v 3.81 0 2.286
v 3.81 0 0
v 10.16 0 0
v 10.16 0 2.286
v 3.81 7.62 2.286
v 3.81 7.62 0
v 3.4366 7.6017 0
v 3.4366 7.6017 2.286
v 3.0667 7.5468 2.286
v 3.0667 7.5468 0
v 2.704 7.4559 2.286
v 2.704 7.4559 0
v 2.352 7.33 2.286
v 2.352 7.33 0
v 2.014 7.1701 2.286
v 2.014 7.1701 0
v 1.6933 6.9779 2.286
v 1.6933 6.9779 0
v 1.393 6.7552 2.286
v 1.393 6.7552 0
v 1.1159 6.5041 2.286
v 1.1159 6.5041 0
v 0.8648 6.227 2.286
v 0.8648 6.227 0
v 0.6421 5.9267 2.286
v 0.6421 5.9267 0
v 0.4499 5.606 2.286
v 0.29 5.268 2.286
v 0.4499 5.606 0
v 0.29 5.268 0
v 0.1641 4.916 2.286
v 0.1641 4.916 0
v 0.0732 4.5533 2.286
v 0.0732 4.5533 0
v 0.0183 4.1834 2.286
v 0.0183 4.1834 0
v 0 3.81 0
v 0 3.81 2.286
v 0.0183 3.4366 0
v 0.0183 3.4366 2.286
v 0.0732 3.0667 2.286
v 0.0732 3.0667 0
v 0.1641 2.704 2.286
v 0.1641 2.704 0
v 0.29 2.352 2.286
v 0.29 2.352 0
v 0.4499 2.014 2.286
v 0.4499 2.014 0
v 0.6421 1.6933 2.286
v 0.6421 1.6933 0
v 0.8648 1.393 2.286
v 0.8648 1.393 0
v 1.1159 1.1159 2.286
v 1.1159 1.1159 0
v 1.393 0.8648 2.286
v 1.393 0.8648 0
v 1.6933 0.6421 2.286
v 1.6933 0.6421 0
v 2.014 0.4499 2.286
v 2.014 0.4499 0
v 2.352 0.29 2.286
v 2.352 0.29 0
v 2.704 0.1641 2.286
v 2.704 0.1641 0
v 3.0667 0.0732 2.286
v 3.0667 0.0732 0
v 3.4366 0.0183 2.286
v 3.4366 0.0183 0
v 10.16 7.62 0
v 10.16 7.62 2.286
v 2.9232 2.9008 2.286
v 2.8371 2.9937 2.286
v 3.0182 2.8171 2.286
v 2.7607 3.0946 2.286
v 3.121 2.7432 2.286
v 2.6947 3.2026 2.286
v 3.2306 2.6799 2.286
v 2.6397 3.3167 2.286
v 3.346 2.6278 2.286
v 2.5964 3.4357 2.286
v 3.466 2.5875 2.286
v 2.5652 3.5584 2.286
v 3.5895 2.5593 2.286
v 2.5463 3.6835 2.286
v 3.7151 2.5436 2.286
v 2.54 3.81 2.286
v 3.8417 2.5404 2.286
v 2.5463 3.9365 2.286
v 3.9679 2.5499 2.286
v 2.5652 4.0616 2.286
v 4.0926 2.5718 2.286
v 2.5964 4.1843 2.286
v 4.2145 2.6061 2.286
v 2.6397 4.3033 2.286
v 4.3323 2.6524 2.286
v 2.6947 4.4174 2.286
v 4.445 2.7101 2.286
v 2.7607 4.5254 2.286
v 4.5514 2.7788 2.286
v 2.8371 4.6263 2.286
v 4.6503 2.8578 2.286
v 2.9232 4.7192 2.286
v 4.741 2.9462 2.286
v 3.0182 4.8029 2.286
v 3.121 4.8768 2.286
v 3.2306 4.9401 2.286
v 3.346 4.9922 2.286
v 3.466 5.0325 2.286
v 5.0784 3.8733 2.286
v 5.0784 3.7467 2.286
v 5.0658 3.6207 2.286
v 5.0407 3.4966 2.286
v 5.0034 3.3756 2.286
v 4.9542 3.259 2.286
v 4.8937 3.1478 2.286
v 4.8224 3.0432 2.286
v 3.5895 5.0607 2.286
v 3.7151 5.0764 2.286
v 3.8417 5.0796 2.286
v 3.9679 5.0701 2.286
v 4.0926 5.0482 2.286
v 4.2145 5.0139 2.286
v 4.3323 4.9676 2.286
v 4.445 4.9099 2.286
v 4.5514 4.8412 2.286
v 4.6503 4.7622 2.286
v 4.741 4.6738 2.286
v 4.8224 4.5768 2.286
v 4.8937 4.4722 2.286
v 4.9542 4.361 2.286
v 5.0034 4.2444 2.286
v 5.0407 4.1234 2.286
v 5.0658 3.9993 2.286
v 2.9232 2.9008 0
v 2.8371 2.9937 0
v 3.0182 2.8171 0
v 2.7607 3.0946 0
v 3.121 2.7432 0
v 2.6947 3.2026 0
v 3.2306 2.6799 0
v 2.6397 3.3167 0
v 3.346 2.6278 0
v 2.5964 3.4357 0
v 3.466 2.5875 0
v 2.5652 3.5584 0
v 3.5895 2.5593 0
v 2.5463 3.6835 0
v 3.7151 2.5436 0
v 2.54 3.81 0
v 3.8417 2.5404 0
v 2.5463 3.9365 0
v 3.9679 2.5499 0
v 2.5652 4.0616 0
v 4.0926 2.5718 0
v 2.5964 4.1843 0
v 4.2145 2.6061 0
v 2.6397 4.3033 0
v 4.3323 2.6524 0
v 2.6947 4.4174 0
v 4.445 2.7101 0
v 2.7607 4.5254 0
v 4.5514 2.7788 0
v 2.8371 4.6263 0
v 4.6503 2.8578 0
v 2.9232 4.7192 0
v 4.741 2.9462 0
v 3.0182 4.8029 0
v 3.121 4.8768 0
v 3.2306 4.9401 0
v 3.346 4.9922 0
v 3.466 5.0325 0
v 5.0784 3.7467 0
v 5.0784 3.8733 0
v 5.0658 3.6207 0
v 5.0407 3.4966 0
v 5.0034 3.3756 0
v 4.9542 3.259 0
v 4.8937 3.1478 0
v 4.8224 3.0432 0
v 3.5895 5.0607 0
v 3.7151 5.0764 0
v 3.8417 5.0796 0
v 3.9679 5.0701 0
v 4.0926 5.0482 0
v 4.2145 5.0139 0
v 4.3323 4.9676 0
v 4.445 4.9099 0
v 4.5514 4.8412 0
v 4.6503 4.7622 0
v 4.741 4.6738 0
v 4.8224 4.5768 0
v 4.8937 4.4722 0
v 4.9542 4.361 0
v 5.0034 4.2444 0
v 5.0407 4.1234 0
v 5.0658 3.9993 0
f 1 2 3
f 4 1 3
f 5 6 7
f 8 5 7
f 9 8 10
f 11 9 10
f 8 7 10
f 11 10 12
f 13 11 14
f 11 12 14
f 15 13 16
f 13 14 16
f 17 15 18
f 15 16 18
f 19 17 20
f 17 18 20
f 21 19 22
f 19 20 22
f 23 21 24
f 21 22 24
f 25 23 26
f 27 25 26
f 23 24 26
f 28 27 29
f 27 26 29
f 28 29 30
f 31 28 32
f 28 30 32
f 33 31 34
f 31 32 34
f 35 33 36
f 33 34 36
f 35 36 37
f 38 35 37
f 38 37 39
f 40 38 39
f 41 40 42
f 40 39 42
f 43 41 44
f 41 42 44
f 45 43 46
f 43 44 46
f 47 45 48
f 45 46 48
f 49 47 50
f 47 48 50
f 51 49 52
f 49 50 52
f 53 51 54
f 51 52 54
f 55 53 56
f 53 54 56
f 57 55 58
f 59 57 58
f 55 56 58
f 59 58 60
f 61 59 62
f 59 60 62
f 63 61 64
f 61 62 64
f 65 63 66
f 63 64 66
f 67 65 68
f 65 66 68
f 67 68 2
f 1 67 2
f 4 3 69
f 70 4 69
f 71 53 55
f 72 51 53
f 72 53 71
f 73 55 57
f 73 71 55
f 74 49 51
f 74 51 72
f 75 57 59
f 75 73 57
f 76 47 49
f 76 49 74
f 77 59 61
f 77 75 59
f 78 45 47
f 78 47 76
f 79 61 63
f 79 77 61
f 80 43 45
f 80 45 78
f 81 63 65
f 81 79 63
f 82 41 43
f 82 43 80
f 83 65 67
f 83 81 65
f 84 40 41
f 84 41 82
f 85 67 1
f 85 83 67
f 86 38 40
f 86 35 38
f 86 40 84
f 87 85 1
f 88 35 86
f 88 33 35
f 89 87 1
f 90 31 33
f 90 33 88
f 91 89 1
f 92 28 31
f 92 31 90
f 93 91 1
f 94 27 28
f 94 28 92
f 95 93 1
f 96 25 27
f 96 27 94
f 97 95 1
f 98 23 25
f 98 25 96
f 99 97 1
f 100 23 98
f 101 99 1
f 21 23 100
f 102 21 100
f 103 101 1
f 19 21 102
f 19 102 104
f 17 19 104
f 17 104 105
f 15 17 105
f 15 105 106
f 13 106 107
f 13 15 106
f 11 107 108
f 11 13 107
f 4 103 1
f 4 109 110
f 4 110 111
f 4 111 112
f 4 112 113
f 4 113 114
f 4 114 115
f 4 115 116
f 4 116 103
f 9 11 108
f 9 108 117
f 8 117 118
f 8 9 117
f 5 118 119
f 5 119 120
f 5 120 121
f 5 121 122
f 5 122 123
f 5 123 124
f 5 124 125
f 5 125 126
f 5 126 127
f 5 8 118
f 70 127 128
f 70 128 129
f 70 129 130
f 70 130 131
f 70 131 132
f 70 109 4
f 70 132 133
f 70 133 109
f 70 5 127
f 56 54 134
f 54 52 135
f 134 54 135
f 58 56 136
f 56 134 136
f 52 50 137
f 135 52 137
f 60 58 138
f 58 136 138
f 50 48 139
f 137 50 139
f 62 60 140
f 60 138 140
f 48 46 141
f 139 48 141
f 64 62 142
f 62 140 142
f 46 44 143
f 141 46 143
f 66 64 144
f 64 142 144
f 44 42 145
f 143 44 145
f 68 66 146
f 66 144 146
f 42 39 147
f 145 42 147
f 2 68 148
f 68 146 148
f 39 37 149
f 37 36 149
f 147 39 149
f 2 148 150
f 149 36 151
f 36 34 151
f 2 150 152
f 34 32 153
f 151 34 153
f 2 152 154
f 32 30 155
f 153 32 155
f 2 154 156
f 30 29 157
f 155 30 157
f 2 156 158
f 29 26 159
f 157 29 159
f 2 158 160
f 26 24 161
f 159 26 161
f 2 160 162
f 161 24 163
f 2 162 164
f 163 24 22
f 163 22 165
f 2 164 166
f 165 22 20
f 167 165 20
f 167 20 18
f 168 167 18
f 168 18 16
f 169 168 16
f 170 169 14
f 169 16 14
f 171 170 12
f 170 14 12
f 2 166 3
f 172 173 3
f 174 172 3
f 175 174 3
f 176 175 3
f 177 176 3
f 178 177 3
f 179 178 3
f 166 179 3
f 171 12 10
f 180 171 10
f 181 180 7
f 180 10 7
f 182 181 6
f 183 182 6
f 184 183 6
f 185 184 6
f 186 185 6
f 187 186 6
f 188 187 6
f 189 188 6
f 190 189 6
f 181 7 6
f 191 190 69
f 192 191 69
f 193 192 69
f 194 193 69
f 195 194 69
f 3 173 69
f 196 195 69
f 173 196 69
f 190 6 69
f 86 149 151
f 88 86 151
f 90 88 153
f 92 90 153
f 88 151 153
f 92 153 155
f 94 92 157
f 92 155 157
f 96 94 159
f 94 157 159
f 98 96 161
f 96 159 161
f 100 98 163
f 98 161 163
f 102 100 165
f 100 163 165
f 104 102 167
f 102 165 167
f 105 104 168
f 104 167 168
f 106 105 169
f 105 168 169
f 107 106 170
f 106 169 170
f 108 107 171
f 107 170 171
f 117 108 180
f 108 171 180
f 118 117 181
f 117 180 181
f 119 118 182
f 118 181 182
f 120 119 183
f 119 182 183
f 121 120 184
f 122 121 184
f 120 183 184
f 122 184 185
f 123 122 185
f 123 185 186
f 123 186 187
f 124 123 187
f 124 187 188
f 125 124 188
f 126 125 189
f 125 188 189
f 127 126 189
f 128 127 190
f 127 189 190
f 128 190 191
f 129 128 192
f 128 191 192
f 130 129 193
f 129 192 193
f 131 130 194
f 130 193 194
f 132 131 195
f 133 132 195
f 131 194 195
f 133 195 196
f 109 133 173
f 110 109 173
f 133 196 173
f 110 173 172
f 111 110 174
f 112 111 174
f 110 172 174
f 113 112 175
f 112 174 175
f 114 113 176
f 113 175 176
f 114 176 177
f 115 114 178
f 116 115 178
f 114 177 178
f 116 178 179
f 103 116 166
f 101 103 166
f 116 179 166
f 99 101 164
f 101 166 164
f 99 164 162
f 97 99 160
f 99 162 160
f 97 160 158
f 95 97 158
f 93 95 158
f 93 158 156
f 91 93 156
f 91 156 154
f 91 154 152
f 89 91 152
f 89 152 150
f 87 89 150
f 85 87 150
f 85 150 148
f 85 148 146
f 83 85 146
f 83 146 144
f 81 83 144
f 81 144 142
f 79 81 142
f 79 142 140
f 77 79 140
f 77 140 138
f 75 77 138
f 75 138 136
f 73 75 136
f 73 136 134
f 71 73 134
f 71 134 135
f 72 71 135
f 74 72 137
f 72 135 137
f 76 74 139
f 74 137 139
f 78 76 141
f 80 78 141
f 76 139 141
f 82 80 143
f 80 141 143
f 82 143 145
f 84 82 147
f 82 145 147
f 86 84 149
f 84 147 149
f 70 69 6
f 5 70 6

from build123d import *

# Parameters (mm, degrees)
F1_DEPTH = 2.286


with BuildPart() as f1:
    # F0 (on Top) → F1 (new body)
    with BuildSketch(Plane.XY):
        with BuildLine():
            ThreePointArc((0, 3.81), (1.115923, 1.115923), (3.81, 0))
            Line((3.81, 0), (10.16, 0))
            Line((10.16, 0), (10.16, 7.62))
            Line((10.16, 7.62), (3.81, 7.62))
            ThreePointArc((3.81, 7.62), (1.115923, 6.504077), (0, 3.81))
        make_face()
        with BuildLine():
            ThreePointArc((5.08, 3.81), (3.81, 2.54), (2.54, 3.81))
            ThreePointArc((2.54, 3.81), (3.81, 5.08), (5.08, 3.81))
        make_face(mode=Mode.SUBTRACT)
    extrude(amount=F1_DEPTH)


solid = f1.part
